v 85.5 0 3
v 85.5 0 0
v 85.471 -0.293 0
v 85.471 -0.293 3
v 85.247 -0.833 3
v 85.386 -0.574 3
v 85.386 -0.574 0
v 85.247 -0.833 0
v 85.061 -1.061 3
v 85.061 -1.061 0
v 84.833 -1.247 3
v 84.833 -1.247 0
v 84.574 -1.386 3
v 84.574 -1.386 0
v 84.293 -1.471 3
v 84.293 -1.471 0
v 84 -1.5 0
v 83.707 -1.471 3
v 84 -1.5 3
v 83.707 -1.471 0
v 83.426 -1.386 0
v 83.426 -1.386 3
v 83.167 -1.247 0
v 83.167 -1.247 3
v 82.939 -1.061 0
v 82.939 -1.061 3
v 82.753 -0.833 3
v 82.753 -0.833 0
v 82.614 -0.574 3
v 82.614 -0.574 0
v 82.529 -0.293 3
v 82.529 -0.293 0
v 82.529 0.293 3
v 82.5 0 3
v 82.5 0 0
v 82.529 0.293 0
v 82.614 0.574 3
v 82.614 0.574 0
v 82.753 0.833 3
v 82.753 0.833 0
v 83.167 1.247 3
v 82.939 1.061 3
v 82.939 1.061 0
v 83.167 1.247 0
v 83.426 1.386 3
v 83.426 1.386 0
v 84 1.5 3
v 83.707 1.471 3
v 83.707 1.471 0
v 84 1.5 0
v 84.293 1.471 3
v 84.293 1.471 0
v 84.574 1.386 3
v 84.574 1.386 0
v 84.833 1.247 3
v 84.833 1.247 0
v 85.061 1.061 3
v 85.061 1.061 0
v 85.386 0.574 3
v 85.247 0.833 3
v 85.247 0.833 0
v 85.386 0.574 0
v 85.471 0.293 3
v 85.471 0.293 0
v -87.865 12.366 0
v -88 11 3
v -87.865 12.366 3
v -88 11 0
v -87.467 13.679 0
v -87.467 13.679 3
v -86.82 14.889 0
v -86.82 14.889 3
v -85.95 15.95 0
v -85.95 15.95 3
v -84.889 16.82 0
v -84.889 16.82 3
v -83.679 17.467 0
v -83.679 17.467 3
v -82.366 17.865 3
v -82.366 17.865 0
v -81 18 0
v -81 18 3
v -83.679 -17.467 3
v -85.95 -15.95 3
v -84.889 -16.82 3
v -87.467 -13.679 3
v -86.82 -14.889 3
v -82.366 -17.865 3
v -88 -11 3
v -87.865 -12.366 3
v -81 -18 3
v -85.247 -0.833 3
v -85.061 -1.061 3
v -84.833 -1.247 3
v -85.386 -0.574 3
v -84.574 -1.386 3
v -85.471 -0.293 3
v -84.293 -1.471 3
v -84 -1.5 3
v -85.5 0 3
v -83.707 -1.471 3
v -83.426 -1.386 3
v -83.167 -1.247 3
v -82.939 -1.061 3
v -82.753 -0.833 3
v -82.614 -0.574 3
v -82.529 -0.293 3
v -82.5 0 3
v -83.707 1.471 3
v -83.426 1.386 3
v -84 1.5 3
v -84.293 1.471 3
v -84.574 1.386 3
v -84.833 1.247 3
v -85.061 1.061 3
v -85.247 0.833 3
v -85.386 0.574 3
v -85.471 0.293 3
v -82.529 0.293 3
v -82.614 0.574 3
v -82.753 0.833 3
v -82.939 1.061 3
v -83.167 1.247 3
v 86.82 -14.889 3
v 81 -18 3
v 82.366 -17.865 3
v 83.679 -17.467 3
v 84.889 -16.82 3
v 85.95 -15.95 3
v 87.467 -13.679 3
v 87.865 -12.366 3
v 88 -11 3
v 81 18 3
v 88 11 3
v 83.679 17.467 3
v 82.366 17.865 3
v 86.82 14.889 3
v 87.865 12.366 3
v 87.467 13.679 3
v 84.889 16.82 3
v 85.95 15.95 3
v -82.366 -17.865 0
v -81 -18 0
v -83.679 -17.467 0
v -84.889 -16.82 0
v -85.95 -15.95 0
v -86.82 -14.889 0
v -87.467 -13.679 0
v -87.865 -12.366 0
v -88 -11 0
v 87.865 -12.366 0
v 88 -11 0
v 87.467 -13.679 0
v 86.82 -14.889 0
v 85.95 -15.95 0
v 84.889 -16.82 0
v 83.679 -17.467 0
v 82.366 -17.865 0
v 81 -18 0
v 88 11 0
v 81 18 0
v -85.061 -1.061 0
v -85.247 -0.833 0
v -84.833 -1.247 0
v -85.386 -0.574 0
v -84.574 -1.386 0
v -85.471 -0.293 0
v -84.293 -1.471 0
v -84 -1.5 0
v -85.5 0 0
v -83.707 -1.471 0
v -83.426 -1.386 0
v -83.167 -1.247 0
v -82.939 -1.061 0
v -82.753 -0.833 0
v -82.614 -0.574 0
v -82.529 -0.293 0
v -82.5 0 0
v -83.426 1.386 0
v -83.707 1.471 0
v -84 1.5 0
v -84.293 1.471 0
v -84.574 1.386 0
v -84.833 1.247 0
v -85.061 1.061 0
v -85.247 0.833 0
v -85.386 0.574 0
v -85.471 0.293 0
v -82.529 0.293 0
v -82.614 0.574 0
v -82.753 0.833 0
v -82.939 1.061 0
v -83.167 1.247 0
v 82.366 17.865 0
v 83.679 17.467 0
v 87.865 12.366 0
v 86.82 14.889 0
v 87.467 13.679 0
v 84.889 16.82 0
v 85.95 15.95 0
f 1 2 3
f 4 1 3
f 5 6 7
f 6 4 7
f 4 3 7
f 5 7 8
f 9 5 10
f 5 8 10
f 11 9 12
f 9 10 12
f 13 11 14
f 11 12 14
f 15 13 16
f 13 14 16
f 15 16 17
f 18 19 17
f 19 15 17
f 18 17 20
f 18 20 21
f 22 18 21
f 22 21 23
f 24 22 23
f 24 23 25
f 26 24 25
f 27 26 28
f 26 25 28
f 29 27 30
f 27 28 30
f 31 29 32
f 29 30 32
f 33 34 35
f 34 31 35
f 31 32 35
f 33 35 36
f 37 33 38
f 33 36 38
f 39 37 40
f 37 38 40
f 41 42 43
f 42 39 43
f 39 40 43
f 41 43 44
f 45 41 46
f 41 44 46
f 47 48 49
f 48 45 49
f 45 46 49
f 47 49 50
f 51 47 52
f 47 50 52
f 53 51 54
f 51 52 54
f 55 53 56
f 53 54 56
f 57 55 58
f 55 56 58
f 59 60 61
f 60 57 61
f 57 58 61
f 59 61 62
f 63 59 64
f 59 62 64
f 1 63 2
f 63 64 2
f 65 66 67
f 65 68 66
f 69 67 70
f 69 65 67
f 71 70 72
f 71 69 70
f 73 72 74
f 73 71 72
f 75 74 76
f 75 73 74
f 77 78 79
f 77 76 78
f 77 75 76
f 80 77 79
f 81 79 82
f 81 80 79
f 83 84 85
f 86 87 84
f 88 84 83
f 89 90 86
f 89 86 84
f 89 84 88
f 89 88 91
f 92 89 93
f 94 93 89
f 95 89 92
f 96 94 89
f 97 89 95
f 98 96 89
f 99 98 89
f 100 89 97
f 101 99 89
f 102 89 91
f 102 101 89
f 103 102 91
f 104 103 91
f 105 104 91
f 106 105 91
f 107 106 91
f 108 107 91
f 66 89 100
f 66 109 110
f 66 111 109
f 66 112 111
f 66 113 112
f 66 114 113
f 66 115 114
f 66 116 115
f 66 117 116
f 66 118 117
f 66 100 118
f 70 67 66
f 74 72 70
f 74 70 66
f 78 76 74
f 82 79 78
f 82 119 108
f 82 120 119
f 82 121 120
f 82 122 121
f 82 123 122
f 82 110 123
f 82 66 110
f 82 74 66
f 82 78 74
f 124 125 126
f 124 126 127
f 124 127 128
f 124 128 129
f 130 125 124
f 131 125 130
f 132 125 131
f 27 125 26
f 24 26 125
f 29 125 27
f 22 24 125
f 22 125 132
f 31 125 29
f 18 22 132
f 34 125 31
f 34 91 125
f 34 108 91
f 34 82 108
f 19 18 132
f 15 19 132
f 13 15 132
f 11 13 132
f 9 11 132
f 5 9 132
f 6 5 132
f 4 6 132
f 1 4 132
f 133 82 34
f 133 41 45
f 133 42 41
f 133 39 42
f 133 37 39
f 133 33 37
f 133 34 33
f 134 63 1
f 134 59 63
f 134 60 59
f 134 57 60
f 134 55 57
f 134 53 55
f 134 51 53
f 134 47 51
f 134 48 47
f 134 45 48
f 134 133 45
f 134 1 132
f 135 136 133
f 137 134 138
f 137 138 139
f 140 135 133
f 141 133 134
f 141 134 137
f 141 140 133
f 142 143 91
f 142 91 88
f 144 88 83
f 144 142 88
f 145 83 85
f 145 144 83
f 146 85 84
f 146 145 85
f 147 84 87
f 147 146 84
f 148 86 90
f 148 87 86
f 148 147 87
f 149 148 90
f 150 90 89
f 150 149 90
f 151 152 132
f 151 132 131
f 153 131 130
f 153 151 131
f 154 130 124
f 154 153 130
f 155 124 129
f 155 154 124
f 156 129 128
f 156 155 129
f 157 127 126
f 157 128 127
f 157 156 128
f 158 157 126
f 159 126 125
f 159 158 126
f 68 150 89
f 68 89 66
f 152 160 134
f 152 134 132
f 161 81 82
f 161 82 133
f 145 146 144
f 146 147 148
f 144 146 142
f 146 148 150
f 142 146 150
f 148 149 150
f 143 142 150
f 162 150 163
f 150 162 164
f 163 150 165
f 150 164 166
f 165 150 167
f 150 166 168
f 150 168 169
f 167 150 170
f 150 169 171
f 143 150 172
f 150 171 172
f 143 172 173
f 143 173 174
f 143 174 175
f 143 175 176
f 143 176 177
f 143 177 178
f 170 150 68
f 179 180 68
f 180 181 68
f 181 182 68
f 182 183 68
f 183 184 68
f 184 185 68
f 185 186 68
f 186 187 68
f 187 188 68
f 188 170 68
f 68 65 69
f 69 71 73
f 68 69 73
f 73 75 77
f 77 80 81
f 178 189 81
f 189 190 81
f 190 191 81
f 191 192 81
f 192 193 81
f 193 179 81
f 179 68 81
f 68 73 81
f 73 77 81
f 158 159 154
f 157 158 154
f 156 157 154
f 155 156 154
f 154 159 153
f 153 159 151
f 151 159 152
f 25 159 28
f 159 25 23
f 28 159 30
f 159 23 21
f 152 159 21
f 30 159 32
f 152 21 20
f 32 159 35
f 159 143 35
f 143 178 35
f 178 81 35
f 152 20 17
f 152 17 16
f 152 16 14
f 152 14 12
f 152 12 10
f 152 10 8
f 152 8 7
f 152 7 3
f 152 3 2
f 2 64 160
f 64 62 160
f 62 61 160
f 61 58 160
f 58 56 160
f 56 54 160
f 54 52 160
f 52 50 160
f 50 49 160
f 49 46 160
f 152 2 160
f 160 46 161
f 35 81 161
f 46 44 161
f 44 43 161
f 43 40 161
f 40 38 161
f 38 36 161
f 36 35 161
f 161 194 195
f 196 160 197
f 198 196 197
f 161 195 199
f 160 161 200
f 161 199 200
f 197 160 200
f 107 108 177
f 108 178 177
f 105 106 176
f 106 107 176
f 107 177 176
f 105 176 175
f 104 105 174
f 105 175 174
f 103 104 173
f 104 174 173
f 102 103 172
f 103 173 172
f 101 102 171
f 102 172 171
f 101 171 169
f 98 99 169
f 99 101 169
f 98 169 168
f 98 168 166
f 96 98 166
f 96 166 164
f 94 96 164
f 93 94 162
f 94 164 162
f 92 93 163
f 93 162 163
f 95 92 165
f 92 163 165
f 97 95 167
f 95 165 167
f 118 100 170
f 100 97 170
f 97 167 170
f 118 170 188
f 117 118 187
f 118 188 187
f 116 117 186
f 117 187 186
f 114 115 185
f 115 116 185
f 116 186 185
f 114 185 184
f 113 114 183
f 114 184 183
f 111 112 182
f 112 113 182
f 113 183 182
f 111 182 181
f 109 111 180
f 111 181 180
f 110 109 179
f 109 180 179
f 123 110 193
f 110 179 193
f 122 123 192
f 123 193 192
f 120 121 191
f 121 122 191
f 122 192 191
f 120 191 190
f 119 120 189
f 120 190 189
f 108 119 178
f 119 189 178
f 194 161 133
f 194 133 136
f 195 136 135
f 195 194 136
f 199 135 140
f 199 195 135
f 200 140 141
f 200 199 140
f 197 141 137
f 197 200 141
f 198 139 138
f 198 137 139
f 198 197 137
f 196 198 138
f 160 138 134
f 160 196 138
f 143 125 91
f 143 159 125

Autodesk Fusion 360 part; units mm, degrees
sketch "Sketch1" plane through (0, 0, 0) normal (0, 0, 1) x (1, 0, 0)
  line L0 (-81, 18) -> (81, 18)
  line L1 (88, 11) -> (88, -11)
  line L2 (81, -18) -> (-81, -18)
  line L3 (-88, -11) -> (-88, 11)
  line L4 (-88, 18) -> (88, -18) construction
  line L5 (88, 18) -> (-88, -18) construction
  arc A0 (-81, 18) -> (-88, 11) centre (-81, 11) ccw
  arc A1 (-88, -11) -> (-81, -18) centre (-81, -11) ccw
  arc A2 (81, -18) -> (88, -11) centre (81, -11) ccw
  arc A3 (88, 11) -> (81, 18) centre (81, 11) ccw
  line L6 (0, 0) -> (27, 0) construction
  circle A4 centre (-84, 0) radius 1.5
  line L7 (0, 0) -> (0, 18) construction
  circle A5 centre (84, 0) radius 1.5
  dimension "d28" = 176
  dimension "d29" = 36
  dimension "d30" = 7
  dimension "d35" = 3
  dimension "d36" = 4
  dimension "d37" = 18
extrude "Extrude7" add sketch "Sketch1" along normal blind 3
sketch "Sketch3" plane through (0, 0, 3) normal (0, 0, 1) x (-1, 0, 0)
  circle A0 centre (0, -13) radius 1.5
  circle A1 centre (-85, 0) radius 1.5
  circle A2 centre (0, 13) radius 1.5
  circle A3 centre (85, 0) radius 1.5
  line L0 (-79, 9) -> (79, 9)
  line L1 (79, 9) -> (79, -9)
  line L2 (79, -9) -> (-79, -9)
  line L3 (-79, -9) -> (-79, 9)
  arc A4 (-83, 18) -> (-90, 11) centre (-83, 11) ccw
  line L4 (-90, 11) -> (-90, -11)
  arc A5 (-90, -11) -> (-83, -18) centre (-83, -11) ccw
  line L5 (-83, -18) -> (83, -18)
  arc A6 (83, -18) -> (90, -11) centre (83, -11) ccw
  line L6 (90, -11) -> (90, 11)
  arc A7 (90, 11) -> (83, 18) centre (83, 11) ccw
  line L7 (83, 18) -> (-83, 18)
  circle A8 centre (0, 13) radius 1.5
